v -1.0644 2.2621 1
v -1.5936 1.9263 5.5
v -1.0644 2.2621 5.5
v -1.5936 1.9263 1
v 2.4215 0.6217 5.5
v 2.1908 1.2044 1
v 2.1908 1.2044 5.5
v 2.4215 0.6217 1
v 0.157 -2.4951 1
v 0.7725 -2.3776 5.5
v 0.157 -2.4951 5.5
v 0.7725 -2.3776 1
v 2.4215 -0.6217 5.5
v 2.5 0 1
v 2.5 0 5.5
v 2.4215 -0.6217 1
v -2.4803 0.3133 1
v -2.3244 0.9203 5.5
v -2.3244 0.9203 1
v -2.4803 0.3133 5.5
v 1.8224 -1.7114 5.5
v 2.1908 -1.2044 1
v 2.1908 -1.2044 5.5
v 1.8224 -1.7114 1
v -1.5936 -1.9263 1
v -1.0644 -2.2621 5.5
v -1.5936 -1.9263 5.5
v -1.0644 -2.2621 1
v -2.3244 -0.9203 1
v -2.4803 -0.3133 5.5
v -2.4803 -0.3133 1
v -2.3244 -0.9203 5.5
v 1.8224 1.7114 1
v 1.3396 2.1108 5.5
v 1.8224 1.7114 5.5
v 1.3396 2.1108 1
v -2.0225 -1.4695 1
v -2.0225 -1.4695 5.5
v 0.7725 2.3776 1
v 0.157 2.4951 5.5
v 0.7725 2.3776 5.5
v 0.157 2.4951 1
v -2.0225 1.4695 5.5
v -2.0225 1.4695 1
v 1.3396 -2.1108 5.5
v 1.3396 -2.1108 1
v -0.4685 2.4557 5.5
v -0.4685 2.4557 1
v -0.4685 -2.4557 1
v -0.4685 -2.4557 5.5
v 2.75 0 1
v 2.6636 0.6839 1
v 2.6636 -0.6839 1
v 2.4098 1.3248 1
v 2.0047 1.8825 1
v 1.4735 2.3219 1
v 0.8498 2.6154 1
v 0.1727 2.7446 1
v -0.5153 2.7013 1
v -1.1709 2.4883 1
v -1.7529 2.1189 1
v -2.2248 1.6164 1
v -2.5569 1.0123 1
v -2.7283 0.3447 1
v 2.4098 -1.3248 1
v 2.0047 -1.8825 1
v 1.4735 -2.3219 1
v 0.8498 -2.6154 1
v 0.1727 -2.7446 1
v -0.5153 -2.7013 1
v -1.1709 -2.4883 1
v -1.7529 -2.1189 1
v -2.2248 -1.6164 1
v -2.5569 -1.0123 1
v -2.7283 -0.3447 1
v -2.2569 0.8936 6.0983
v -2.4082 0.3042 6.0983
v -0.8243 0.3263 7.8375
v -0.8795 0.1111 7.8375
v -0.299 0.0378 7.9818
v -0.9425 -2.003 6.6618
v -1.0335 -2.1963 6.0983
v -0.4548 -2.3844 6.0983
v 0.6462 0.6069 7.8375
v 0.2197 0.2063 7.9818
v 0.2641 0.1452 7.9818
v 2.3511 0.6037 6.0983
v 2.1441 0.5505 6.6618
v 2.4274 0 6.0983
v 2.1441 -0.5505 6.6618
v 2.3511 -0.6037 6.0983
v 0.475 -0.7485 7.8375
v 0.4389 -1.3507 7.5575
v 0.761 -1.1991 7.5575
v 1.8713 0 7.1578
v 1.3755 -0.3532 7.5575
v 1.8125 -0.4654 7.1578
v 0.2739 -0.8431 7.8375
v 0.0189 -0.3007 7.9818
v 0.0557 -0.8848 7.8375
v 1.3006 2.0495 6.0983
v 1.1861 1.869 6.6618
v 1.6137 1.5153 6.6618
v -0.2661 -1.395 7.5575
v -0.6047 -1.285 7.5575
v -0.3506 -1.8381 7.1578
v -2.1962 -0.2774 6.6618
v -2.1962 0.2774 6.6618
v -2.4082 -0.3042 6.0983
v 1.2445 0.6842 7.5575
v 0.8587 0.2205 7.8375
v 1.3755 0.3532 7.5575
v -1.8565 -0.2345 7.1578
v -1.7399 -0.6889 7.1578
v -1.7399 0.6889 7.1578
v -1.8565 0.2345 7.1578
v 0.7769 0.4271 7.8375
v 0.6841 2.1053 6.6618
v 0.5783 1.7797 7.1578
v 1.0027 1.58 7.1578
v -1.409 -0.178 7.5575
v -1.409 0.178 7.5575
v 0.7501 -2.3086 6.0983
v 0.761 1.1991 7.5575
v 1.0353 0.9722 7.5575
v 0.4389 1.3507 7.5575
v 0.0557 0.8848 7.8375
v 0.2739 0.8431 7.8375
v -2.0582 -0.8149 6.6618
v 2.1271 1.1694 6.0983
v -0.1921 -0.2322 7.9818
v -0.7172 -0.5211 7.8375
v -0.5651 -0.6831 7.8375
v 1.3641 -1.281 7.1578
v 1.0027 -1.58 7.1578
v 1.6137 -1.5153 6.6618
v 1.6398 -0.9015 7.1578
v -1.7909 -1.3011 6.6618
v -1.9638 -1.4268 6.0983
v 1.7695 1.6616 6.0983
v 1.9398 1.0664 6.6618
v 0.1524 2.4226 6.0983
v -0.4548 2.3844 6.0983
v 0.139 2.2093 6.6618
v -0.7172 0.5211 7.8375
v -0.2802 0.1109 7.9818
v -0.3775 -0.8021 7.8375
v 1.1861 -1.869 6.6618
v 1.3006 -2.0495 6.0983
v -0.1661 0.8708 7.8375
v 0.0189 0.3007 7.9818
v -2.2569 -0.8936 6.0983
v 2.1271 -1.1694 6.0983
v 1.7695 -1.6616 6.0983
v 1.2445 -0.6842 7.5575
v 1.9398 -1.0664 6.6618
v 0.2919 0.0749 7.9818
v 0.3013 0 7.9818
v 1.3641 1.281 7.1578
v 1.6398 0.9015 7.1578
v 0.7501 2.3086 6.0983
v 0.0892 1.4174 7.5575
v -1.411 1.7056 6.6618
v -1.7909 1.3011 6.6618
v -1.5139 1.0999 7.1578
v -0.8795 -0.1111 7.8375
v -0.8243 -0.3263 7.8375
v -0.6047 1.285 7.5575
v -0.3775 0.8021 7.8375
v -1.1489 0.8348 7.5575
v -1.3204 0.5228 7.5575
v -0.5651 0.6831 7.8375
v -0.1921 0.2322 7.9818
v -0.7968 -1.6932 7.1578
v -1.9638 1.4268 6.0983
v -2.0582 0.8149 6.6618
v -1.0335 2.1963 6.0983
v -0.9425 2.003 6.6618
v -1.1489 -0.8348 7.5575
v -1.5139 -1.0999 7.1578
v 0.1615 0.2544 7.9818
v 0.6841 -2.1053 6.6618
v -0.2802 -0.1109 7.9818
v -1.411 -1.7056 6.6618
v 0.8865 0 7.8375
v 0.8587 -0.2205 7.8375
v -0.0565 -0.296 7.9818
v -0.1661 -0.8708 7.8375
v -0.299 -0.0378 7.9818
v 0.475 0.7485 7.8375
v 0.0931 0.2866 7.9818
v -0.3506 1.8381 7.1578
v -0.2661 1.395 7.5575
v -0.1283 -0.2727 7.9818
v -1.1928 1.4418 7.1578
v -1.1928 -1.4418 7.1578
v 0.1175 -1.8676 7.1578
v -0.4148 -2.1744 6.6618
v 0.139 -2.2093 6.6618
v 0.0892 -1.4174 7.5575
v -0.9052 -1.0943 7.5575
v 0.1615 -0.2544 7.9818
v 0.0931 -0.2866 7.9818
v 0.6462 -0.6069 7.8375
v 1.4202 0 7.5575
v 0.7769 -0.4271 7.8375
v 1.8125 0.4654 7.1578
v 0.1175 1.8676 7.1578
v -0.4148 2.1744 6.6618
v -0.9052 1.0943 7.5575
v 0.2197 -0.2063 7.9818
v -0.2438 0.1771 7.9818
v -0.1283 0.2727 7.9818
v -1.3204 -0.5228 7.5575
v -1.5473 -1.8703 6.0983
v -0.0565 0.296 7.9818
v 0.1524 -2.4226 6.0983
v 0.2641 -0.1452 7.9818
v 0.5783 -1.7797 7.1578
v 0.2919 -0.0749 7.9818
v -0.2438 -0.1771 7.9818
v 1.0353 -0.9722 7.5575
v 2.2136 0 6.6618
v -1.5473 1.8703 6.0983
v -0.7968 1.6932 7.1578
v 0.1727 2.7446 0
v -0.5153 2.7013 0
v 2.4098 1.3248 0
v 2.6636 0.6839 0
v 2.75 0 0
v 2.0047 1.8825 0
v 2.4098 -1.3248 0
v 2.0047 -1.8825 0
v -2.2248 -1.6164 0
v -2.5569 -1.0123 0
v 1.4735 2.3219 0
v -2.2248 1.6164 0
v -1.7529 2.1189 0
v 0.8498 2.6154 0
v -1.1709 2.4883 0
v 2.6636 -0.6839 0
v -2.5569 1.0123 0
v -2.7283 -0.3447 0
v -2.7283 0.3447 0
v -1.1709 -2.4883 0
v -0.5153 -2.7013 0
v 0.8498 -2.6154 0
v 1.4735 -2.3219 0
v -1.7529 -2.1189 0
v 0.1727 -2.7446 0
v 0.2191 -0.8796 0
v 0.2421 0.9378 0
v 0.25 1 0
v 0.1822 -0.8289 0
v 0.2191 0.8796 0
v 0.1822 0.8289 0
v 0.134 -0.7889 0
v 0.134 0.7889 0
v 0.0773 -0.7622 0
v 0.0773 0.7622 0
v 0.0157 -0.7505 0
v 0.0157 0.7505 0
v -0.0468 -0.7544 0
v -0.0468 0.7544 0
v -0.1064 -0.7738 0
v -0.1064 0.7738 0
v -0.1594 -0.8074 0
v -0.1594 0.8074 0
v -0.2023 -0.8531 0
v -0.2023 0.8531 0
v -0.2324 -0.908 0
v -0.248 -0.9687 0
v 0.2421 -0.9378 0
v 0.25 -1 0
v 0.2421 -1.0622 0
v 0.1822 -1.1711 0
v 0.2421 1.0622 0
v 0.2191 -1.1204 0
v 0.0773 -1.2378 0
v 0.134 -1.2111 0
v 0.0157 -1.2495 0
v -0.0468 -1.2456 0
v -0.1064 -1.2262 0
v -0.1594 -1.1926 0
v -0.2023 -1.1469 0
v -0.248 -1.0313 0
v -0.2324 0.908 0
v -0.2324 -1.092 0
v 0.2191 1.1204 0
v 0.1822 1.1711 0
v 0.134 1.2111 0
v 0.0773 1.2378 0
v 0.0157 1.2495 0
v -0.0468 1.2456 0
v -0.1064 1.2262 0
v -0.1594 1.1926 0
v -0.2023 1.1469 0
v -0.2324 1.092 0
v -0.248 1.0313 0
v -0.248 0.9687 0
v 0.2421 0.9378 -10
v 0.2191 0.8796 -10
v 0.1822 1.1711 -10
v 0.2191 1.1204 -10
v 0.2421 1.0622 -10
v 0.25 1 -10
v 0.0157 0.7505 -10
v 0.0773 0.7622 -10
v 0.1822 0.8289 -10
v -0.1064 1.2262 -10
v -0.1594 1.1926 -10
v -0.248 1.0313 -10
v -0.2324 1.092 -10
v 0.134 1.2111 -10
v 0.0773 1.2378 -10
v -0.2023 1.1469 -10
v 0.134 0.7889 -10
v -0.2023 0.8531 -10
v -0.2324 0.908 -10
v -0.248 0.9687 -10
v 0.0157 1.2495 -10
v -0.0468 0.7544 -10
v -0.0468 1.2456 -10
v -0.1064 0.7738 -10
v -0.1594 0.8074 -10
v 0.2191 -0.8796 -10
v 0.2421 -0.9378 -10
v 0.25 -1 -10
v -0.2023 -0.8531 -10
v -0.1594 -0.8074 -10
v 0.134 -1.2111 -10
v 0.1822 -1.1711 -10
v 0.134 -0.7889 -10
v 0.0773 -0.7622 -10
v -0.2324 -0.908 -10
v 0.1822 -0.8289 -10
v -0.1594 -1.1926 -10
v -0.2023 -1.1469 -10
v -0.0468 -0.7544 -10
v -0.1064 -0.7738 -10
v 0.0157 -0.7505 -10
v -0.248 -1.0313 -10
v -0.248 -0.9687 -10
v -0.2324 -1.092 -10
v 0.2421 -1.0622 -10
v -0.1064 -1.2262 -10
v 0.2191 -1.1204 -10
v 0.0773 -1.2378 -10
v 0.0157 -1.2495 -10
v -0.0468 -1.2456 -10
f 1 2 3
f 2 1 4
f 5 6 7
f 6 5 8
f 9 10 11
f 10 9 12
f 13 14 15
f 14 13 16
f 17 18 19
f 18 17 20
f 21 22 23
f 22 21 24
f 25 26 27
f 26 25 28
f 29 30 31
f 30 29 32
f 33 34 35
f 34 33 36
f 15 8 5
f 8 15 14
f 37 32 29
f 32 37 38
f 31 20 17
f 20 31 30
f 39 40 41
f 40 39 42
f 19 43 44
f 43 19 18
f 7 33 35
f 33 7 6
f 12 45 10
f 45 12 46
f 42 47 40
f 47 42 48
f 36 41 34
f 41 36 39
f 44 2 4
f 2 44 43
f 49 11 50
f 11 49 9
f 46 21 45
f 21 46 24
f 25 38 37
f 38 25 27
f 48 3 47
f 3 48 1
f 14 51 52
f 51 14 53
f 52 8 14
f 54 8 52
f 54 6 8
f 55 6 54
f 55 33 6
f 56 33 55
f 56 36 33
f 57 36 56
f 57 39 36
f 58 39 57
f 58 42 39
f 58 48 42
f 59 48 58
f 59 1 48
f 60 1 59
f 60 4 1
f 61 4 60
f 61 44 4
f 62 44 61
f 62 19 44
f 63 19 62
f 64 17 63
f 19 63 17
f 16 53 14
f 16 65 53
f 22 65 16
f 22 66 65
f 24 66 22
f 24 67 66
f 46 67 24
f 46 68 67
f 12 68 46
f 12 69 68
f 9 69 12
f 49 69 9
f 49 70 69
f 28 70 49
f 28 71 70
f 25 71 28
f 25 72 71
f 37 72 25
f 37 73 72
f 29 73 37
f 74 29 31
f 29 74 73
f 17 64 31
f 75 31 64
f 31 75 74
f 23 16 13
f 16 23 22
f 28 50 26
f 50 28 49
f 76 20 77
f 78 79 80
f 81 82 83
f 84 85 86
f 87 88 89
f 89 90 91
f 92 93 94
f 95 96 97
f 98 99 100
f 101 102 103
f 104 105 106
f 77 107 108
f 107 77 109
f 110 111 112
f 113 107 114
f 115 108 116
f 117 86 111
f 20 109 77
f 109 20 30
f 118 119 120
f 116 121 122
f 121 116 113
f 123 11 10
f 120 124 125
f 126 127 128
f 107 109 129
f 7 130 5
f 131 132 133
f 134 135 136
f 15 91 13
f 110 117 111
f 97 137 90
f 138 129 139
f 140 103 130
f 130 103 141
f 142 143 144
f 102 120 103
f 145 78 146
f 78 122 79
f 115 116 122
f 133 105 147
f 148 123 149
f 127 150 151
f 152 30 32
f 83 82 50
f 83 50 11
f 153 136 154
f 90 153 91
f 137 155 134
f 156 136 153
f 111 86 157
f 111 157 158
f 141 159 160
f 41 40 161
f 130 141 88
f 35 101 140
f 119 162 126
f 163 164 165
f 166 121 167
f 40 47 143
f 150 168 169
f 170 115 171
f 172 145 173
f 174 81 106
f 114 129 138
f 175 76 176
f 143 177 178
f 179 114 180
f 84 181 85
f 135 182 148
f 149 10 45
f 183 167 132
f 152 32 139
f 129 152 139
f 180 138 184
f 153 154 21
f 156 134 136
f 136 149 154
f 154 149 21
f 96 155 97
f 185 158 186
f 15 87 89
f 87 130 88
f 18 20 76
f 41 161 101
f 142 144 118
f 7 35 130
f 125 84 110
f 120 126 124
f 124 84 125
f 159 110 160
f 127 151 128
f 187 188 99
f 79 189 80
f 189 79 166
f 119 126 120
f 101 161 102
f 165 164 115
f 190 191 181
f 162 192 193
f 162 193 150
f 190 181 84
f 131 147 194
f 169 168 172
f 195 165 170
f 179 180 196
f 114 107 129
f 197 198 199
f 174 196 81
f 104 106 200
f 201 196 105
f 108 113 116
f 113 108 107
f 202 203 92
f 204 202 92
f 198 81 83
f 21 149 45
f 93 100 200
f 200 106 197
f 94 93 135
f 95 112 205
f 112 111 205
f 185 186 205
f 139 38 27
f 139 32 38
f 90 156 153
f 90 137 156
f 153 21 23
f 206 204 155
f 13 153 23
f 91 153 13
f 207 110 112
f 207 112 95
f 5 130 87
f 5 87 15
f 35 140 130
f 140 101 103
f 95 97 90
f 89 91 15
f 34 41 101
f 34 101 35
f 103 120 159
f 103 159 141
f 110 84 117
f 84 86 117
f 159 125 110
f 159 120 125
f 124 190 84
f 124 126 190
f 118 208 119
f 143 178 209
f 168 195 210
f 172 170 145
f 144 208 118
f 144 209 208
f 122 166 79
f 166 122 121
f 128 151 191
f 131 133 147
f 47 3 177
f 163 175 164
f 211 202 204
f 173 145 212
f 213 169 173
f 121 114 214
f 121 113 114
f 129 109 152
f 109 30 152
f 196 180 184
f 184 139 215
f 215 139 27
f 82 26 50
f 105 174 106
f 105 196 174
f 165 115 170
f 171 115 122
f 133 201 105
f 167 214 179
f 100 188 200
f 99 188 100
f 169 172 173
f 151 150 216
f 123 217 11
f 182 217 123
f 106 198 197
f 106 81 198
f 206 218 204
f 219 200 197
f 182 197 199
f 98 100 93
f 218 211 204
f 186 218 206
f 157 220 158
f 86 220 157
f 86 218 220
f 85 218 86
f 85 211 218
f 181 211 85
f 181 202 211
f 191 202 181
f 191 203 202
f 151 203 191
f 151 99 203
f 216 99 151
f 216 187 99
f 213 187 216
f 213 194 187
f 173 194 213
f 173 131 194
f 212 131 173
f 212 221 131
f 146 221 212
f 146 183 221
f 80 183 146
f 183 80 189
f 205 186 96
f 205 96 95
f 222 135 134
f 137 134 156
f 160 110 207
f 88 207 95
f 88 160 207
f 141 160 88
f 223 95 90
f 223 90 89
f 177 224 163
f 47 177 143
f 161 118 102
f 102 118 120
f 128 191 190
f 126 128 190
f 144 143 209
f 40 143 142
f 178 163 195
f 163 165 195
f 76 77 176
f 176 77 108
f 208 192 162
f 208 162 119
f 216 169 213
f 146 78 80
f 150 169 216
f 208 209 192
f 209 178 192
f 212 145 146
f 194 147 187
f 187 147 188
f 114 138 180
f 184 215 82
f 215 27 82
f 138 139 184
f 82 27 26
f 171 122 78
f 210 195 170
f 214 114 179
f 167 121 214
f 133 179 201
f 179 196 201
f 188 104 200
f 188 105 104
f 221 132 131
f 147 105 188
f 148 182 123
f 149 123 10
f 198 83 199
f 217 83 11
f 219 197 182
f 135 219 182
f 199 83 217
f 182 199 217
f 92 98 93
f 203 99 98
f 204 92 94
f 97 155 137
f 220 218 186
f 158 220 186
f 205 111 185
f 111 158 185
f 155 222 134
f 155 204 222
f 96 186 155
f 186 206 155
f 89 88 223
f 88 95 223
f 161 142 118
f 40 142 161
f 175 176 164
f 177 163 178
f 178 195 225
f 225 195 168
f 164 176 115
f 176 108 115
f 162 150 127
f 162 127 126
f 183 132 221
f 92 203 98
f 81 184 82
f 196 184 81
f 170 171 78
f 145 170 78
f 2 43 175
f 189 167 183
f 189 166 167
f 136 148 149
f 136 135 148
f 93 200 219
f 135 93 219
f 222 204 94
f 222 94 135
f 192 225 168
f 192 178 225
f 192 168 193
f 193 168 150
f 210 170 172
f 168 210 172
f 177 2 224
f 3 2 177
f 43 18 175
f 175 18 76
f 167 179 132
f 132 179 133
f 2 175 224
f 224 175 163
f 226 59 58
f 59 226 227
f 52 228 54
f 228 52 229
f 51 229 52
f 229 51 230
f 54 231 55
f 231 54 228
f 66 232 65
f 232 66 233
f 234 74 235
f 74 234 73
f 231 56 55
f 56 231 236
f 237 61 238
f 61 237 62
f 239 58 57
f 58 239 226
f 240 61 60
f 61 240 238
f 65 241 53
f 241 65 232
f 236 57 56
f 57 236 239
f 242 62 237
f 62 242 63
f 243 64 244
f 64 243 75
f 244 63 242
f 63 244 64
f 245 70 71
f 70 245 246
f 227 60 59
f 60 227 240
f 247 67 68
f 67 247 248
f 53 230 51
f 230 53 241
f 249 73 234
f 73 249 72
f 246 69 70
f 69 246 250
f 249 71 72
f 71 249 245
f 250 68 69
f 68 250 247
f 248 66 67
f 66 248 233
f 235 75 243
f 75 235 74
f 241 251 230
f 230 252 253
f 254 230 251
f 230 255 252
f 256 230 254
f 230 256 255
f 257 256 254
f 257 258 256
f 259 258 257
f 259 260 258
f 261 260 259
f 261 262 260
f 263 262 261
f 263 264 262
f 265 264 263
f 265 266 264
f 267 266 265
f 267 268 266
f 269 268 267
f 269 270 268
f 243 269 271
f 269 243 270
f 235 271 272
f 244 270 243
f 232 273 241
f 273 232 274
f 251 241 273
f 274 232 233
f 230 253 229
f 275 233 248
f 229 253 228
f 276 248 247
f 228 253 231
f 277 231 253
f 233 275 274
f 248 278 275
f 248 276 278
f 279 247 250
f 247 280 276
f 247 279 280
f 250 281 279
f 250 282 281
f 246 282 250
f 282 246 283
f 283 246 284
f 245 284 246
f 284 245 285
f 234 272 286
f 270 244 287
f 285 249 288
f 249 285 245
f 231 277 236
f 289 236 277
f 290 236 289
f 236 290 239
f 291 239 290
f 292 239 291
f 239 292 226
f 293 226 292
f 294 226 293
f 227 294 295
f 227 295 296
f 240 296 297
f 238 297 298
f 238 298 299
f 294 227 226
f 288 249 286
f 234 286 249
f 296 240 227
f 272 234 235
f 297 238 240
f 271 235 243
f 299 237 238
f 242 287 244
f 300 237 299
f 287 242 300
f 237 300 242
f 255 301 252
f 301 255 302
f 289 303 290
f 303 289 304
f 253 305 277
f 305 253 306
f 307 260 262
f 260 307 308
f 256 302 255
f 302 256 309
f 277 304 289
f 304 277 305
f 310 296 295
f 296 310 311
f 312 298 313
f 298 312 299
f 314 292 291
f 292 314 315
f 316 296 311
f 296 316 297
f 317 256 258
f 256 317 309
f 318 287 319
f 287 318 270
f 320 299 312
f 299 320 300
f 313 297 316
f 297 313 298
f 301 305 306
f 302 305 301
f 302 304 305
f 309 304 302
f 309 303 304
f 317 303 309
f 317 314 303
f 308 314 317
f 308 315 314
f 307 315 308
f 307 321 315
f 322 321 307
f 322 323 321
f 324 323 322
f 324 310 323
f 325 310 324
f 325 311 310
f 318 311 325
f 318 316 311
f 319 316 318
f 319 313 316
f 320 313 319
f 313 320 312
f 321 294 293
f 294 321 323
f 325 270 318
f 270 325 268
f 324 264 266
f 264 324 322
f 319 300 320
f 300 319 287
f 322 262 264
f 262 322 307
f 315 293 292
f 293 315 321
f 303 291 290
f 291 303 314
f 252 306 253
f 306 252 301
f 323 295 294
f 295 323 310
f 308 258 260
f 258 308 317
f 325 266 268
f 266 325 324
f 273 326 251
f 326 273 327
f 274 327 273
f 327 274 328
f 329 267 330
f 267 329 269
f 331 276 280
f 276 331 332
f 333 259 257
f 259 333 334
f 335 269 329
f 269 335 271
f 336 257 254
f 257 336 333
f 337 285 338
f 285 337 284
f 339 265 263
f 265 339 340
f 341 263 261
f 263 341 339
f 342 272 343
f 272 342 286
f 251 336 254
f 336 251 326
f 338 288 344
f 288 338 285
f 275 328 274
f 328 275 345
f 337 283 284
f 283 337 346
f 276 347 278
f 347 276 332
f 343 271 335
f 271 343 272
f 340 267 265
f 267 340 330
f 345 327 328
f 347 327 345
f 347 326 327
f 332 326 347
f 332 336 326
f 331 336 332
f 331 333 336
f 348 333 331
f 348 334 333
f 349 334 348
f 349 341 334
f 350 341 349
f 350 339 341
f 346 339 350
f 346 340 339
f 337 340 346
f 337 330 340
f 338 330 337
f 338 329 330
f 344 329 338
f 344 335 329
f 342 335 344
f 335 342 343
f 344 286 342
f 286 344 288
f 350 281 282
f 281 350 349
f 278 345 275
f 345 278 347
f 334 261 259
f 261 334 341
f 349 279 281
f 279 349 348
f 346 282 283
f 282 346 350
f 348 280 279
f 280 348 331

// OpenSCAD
// https://www.thingiverse.com/thing:38396

//LED Dimensions
led_d=5; //LED Diameter
led_h=8; //LED Height
led_fh=1; //LED FLange Thickness
led_fd=5.5; //LED Flange Diameter
wire_d=.5; //Wire Diameter
wire_h=10; //Wire Height
wire_da=2; // THe distance between the Wires
led();
module led(color=[1,0,0]){
	color(color) {
		translate([0,0,led_fh])cylinder(led_h-(led_d/2)-led_fh,led_d/2,led_d/2, $fn=25);
		translate([0,0,led_h-(led_d/2)])sphere(led_d/2,  $fn=25);
		cylinder(led_fh,led_fd/2,led_fd/2, $fn=25);
	}
	color([1,1,1]*.4) {
		translate([0,wire_da/2,-wire_h])cylinder(wire_h,wire_d/2,wire_d/2, $fn=25);
		translate([0,wire_da/-2,-wire_h])cylinder(wire_h,wire_d/2,wire_d/2, $fn=25);
	}
}
